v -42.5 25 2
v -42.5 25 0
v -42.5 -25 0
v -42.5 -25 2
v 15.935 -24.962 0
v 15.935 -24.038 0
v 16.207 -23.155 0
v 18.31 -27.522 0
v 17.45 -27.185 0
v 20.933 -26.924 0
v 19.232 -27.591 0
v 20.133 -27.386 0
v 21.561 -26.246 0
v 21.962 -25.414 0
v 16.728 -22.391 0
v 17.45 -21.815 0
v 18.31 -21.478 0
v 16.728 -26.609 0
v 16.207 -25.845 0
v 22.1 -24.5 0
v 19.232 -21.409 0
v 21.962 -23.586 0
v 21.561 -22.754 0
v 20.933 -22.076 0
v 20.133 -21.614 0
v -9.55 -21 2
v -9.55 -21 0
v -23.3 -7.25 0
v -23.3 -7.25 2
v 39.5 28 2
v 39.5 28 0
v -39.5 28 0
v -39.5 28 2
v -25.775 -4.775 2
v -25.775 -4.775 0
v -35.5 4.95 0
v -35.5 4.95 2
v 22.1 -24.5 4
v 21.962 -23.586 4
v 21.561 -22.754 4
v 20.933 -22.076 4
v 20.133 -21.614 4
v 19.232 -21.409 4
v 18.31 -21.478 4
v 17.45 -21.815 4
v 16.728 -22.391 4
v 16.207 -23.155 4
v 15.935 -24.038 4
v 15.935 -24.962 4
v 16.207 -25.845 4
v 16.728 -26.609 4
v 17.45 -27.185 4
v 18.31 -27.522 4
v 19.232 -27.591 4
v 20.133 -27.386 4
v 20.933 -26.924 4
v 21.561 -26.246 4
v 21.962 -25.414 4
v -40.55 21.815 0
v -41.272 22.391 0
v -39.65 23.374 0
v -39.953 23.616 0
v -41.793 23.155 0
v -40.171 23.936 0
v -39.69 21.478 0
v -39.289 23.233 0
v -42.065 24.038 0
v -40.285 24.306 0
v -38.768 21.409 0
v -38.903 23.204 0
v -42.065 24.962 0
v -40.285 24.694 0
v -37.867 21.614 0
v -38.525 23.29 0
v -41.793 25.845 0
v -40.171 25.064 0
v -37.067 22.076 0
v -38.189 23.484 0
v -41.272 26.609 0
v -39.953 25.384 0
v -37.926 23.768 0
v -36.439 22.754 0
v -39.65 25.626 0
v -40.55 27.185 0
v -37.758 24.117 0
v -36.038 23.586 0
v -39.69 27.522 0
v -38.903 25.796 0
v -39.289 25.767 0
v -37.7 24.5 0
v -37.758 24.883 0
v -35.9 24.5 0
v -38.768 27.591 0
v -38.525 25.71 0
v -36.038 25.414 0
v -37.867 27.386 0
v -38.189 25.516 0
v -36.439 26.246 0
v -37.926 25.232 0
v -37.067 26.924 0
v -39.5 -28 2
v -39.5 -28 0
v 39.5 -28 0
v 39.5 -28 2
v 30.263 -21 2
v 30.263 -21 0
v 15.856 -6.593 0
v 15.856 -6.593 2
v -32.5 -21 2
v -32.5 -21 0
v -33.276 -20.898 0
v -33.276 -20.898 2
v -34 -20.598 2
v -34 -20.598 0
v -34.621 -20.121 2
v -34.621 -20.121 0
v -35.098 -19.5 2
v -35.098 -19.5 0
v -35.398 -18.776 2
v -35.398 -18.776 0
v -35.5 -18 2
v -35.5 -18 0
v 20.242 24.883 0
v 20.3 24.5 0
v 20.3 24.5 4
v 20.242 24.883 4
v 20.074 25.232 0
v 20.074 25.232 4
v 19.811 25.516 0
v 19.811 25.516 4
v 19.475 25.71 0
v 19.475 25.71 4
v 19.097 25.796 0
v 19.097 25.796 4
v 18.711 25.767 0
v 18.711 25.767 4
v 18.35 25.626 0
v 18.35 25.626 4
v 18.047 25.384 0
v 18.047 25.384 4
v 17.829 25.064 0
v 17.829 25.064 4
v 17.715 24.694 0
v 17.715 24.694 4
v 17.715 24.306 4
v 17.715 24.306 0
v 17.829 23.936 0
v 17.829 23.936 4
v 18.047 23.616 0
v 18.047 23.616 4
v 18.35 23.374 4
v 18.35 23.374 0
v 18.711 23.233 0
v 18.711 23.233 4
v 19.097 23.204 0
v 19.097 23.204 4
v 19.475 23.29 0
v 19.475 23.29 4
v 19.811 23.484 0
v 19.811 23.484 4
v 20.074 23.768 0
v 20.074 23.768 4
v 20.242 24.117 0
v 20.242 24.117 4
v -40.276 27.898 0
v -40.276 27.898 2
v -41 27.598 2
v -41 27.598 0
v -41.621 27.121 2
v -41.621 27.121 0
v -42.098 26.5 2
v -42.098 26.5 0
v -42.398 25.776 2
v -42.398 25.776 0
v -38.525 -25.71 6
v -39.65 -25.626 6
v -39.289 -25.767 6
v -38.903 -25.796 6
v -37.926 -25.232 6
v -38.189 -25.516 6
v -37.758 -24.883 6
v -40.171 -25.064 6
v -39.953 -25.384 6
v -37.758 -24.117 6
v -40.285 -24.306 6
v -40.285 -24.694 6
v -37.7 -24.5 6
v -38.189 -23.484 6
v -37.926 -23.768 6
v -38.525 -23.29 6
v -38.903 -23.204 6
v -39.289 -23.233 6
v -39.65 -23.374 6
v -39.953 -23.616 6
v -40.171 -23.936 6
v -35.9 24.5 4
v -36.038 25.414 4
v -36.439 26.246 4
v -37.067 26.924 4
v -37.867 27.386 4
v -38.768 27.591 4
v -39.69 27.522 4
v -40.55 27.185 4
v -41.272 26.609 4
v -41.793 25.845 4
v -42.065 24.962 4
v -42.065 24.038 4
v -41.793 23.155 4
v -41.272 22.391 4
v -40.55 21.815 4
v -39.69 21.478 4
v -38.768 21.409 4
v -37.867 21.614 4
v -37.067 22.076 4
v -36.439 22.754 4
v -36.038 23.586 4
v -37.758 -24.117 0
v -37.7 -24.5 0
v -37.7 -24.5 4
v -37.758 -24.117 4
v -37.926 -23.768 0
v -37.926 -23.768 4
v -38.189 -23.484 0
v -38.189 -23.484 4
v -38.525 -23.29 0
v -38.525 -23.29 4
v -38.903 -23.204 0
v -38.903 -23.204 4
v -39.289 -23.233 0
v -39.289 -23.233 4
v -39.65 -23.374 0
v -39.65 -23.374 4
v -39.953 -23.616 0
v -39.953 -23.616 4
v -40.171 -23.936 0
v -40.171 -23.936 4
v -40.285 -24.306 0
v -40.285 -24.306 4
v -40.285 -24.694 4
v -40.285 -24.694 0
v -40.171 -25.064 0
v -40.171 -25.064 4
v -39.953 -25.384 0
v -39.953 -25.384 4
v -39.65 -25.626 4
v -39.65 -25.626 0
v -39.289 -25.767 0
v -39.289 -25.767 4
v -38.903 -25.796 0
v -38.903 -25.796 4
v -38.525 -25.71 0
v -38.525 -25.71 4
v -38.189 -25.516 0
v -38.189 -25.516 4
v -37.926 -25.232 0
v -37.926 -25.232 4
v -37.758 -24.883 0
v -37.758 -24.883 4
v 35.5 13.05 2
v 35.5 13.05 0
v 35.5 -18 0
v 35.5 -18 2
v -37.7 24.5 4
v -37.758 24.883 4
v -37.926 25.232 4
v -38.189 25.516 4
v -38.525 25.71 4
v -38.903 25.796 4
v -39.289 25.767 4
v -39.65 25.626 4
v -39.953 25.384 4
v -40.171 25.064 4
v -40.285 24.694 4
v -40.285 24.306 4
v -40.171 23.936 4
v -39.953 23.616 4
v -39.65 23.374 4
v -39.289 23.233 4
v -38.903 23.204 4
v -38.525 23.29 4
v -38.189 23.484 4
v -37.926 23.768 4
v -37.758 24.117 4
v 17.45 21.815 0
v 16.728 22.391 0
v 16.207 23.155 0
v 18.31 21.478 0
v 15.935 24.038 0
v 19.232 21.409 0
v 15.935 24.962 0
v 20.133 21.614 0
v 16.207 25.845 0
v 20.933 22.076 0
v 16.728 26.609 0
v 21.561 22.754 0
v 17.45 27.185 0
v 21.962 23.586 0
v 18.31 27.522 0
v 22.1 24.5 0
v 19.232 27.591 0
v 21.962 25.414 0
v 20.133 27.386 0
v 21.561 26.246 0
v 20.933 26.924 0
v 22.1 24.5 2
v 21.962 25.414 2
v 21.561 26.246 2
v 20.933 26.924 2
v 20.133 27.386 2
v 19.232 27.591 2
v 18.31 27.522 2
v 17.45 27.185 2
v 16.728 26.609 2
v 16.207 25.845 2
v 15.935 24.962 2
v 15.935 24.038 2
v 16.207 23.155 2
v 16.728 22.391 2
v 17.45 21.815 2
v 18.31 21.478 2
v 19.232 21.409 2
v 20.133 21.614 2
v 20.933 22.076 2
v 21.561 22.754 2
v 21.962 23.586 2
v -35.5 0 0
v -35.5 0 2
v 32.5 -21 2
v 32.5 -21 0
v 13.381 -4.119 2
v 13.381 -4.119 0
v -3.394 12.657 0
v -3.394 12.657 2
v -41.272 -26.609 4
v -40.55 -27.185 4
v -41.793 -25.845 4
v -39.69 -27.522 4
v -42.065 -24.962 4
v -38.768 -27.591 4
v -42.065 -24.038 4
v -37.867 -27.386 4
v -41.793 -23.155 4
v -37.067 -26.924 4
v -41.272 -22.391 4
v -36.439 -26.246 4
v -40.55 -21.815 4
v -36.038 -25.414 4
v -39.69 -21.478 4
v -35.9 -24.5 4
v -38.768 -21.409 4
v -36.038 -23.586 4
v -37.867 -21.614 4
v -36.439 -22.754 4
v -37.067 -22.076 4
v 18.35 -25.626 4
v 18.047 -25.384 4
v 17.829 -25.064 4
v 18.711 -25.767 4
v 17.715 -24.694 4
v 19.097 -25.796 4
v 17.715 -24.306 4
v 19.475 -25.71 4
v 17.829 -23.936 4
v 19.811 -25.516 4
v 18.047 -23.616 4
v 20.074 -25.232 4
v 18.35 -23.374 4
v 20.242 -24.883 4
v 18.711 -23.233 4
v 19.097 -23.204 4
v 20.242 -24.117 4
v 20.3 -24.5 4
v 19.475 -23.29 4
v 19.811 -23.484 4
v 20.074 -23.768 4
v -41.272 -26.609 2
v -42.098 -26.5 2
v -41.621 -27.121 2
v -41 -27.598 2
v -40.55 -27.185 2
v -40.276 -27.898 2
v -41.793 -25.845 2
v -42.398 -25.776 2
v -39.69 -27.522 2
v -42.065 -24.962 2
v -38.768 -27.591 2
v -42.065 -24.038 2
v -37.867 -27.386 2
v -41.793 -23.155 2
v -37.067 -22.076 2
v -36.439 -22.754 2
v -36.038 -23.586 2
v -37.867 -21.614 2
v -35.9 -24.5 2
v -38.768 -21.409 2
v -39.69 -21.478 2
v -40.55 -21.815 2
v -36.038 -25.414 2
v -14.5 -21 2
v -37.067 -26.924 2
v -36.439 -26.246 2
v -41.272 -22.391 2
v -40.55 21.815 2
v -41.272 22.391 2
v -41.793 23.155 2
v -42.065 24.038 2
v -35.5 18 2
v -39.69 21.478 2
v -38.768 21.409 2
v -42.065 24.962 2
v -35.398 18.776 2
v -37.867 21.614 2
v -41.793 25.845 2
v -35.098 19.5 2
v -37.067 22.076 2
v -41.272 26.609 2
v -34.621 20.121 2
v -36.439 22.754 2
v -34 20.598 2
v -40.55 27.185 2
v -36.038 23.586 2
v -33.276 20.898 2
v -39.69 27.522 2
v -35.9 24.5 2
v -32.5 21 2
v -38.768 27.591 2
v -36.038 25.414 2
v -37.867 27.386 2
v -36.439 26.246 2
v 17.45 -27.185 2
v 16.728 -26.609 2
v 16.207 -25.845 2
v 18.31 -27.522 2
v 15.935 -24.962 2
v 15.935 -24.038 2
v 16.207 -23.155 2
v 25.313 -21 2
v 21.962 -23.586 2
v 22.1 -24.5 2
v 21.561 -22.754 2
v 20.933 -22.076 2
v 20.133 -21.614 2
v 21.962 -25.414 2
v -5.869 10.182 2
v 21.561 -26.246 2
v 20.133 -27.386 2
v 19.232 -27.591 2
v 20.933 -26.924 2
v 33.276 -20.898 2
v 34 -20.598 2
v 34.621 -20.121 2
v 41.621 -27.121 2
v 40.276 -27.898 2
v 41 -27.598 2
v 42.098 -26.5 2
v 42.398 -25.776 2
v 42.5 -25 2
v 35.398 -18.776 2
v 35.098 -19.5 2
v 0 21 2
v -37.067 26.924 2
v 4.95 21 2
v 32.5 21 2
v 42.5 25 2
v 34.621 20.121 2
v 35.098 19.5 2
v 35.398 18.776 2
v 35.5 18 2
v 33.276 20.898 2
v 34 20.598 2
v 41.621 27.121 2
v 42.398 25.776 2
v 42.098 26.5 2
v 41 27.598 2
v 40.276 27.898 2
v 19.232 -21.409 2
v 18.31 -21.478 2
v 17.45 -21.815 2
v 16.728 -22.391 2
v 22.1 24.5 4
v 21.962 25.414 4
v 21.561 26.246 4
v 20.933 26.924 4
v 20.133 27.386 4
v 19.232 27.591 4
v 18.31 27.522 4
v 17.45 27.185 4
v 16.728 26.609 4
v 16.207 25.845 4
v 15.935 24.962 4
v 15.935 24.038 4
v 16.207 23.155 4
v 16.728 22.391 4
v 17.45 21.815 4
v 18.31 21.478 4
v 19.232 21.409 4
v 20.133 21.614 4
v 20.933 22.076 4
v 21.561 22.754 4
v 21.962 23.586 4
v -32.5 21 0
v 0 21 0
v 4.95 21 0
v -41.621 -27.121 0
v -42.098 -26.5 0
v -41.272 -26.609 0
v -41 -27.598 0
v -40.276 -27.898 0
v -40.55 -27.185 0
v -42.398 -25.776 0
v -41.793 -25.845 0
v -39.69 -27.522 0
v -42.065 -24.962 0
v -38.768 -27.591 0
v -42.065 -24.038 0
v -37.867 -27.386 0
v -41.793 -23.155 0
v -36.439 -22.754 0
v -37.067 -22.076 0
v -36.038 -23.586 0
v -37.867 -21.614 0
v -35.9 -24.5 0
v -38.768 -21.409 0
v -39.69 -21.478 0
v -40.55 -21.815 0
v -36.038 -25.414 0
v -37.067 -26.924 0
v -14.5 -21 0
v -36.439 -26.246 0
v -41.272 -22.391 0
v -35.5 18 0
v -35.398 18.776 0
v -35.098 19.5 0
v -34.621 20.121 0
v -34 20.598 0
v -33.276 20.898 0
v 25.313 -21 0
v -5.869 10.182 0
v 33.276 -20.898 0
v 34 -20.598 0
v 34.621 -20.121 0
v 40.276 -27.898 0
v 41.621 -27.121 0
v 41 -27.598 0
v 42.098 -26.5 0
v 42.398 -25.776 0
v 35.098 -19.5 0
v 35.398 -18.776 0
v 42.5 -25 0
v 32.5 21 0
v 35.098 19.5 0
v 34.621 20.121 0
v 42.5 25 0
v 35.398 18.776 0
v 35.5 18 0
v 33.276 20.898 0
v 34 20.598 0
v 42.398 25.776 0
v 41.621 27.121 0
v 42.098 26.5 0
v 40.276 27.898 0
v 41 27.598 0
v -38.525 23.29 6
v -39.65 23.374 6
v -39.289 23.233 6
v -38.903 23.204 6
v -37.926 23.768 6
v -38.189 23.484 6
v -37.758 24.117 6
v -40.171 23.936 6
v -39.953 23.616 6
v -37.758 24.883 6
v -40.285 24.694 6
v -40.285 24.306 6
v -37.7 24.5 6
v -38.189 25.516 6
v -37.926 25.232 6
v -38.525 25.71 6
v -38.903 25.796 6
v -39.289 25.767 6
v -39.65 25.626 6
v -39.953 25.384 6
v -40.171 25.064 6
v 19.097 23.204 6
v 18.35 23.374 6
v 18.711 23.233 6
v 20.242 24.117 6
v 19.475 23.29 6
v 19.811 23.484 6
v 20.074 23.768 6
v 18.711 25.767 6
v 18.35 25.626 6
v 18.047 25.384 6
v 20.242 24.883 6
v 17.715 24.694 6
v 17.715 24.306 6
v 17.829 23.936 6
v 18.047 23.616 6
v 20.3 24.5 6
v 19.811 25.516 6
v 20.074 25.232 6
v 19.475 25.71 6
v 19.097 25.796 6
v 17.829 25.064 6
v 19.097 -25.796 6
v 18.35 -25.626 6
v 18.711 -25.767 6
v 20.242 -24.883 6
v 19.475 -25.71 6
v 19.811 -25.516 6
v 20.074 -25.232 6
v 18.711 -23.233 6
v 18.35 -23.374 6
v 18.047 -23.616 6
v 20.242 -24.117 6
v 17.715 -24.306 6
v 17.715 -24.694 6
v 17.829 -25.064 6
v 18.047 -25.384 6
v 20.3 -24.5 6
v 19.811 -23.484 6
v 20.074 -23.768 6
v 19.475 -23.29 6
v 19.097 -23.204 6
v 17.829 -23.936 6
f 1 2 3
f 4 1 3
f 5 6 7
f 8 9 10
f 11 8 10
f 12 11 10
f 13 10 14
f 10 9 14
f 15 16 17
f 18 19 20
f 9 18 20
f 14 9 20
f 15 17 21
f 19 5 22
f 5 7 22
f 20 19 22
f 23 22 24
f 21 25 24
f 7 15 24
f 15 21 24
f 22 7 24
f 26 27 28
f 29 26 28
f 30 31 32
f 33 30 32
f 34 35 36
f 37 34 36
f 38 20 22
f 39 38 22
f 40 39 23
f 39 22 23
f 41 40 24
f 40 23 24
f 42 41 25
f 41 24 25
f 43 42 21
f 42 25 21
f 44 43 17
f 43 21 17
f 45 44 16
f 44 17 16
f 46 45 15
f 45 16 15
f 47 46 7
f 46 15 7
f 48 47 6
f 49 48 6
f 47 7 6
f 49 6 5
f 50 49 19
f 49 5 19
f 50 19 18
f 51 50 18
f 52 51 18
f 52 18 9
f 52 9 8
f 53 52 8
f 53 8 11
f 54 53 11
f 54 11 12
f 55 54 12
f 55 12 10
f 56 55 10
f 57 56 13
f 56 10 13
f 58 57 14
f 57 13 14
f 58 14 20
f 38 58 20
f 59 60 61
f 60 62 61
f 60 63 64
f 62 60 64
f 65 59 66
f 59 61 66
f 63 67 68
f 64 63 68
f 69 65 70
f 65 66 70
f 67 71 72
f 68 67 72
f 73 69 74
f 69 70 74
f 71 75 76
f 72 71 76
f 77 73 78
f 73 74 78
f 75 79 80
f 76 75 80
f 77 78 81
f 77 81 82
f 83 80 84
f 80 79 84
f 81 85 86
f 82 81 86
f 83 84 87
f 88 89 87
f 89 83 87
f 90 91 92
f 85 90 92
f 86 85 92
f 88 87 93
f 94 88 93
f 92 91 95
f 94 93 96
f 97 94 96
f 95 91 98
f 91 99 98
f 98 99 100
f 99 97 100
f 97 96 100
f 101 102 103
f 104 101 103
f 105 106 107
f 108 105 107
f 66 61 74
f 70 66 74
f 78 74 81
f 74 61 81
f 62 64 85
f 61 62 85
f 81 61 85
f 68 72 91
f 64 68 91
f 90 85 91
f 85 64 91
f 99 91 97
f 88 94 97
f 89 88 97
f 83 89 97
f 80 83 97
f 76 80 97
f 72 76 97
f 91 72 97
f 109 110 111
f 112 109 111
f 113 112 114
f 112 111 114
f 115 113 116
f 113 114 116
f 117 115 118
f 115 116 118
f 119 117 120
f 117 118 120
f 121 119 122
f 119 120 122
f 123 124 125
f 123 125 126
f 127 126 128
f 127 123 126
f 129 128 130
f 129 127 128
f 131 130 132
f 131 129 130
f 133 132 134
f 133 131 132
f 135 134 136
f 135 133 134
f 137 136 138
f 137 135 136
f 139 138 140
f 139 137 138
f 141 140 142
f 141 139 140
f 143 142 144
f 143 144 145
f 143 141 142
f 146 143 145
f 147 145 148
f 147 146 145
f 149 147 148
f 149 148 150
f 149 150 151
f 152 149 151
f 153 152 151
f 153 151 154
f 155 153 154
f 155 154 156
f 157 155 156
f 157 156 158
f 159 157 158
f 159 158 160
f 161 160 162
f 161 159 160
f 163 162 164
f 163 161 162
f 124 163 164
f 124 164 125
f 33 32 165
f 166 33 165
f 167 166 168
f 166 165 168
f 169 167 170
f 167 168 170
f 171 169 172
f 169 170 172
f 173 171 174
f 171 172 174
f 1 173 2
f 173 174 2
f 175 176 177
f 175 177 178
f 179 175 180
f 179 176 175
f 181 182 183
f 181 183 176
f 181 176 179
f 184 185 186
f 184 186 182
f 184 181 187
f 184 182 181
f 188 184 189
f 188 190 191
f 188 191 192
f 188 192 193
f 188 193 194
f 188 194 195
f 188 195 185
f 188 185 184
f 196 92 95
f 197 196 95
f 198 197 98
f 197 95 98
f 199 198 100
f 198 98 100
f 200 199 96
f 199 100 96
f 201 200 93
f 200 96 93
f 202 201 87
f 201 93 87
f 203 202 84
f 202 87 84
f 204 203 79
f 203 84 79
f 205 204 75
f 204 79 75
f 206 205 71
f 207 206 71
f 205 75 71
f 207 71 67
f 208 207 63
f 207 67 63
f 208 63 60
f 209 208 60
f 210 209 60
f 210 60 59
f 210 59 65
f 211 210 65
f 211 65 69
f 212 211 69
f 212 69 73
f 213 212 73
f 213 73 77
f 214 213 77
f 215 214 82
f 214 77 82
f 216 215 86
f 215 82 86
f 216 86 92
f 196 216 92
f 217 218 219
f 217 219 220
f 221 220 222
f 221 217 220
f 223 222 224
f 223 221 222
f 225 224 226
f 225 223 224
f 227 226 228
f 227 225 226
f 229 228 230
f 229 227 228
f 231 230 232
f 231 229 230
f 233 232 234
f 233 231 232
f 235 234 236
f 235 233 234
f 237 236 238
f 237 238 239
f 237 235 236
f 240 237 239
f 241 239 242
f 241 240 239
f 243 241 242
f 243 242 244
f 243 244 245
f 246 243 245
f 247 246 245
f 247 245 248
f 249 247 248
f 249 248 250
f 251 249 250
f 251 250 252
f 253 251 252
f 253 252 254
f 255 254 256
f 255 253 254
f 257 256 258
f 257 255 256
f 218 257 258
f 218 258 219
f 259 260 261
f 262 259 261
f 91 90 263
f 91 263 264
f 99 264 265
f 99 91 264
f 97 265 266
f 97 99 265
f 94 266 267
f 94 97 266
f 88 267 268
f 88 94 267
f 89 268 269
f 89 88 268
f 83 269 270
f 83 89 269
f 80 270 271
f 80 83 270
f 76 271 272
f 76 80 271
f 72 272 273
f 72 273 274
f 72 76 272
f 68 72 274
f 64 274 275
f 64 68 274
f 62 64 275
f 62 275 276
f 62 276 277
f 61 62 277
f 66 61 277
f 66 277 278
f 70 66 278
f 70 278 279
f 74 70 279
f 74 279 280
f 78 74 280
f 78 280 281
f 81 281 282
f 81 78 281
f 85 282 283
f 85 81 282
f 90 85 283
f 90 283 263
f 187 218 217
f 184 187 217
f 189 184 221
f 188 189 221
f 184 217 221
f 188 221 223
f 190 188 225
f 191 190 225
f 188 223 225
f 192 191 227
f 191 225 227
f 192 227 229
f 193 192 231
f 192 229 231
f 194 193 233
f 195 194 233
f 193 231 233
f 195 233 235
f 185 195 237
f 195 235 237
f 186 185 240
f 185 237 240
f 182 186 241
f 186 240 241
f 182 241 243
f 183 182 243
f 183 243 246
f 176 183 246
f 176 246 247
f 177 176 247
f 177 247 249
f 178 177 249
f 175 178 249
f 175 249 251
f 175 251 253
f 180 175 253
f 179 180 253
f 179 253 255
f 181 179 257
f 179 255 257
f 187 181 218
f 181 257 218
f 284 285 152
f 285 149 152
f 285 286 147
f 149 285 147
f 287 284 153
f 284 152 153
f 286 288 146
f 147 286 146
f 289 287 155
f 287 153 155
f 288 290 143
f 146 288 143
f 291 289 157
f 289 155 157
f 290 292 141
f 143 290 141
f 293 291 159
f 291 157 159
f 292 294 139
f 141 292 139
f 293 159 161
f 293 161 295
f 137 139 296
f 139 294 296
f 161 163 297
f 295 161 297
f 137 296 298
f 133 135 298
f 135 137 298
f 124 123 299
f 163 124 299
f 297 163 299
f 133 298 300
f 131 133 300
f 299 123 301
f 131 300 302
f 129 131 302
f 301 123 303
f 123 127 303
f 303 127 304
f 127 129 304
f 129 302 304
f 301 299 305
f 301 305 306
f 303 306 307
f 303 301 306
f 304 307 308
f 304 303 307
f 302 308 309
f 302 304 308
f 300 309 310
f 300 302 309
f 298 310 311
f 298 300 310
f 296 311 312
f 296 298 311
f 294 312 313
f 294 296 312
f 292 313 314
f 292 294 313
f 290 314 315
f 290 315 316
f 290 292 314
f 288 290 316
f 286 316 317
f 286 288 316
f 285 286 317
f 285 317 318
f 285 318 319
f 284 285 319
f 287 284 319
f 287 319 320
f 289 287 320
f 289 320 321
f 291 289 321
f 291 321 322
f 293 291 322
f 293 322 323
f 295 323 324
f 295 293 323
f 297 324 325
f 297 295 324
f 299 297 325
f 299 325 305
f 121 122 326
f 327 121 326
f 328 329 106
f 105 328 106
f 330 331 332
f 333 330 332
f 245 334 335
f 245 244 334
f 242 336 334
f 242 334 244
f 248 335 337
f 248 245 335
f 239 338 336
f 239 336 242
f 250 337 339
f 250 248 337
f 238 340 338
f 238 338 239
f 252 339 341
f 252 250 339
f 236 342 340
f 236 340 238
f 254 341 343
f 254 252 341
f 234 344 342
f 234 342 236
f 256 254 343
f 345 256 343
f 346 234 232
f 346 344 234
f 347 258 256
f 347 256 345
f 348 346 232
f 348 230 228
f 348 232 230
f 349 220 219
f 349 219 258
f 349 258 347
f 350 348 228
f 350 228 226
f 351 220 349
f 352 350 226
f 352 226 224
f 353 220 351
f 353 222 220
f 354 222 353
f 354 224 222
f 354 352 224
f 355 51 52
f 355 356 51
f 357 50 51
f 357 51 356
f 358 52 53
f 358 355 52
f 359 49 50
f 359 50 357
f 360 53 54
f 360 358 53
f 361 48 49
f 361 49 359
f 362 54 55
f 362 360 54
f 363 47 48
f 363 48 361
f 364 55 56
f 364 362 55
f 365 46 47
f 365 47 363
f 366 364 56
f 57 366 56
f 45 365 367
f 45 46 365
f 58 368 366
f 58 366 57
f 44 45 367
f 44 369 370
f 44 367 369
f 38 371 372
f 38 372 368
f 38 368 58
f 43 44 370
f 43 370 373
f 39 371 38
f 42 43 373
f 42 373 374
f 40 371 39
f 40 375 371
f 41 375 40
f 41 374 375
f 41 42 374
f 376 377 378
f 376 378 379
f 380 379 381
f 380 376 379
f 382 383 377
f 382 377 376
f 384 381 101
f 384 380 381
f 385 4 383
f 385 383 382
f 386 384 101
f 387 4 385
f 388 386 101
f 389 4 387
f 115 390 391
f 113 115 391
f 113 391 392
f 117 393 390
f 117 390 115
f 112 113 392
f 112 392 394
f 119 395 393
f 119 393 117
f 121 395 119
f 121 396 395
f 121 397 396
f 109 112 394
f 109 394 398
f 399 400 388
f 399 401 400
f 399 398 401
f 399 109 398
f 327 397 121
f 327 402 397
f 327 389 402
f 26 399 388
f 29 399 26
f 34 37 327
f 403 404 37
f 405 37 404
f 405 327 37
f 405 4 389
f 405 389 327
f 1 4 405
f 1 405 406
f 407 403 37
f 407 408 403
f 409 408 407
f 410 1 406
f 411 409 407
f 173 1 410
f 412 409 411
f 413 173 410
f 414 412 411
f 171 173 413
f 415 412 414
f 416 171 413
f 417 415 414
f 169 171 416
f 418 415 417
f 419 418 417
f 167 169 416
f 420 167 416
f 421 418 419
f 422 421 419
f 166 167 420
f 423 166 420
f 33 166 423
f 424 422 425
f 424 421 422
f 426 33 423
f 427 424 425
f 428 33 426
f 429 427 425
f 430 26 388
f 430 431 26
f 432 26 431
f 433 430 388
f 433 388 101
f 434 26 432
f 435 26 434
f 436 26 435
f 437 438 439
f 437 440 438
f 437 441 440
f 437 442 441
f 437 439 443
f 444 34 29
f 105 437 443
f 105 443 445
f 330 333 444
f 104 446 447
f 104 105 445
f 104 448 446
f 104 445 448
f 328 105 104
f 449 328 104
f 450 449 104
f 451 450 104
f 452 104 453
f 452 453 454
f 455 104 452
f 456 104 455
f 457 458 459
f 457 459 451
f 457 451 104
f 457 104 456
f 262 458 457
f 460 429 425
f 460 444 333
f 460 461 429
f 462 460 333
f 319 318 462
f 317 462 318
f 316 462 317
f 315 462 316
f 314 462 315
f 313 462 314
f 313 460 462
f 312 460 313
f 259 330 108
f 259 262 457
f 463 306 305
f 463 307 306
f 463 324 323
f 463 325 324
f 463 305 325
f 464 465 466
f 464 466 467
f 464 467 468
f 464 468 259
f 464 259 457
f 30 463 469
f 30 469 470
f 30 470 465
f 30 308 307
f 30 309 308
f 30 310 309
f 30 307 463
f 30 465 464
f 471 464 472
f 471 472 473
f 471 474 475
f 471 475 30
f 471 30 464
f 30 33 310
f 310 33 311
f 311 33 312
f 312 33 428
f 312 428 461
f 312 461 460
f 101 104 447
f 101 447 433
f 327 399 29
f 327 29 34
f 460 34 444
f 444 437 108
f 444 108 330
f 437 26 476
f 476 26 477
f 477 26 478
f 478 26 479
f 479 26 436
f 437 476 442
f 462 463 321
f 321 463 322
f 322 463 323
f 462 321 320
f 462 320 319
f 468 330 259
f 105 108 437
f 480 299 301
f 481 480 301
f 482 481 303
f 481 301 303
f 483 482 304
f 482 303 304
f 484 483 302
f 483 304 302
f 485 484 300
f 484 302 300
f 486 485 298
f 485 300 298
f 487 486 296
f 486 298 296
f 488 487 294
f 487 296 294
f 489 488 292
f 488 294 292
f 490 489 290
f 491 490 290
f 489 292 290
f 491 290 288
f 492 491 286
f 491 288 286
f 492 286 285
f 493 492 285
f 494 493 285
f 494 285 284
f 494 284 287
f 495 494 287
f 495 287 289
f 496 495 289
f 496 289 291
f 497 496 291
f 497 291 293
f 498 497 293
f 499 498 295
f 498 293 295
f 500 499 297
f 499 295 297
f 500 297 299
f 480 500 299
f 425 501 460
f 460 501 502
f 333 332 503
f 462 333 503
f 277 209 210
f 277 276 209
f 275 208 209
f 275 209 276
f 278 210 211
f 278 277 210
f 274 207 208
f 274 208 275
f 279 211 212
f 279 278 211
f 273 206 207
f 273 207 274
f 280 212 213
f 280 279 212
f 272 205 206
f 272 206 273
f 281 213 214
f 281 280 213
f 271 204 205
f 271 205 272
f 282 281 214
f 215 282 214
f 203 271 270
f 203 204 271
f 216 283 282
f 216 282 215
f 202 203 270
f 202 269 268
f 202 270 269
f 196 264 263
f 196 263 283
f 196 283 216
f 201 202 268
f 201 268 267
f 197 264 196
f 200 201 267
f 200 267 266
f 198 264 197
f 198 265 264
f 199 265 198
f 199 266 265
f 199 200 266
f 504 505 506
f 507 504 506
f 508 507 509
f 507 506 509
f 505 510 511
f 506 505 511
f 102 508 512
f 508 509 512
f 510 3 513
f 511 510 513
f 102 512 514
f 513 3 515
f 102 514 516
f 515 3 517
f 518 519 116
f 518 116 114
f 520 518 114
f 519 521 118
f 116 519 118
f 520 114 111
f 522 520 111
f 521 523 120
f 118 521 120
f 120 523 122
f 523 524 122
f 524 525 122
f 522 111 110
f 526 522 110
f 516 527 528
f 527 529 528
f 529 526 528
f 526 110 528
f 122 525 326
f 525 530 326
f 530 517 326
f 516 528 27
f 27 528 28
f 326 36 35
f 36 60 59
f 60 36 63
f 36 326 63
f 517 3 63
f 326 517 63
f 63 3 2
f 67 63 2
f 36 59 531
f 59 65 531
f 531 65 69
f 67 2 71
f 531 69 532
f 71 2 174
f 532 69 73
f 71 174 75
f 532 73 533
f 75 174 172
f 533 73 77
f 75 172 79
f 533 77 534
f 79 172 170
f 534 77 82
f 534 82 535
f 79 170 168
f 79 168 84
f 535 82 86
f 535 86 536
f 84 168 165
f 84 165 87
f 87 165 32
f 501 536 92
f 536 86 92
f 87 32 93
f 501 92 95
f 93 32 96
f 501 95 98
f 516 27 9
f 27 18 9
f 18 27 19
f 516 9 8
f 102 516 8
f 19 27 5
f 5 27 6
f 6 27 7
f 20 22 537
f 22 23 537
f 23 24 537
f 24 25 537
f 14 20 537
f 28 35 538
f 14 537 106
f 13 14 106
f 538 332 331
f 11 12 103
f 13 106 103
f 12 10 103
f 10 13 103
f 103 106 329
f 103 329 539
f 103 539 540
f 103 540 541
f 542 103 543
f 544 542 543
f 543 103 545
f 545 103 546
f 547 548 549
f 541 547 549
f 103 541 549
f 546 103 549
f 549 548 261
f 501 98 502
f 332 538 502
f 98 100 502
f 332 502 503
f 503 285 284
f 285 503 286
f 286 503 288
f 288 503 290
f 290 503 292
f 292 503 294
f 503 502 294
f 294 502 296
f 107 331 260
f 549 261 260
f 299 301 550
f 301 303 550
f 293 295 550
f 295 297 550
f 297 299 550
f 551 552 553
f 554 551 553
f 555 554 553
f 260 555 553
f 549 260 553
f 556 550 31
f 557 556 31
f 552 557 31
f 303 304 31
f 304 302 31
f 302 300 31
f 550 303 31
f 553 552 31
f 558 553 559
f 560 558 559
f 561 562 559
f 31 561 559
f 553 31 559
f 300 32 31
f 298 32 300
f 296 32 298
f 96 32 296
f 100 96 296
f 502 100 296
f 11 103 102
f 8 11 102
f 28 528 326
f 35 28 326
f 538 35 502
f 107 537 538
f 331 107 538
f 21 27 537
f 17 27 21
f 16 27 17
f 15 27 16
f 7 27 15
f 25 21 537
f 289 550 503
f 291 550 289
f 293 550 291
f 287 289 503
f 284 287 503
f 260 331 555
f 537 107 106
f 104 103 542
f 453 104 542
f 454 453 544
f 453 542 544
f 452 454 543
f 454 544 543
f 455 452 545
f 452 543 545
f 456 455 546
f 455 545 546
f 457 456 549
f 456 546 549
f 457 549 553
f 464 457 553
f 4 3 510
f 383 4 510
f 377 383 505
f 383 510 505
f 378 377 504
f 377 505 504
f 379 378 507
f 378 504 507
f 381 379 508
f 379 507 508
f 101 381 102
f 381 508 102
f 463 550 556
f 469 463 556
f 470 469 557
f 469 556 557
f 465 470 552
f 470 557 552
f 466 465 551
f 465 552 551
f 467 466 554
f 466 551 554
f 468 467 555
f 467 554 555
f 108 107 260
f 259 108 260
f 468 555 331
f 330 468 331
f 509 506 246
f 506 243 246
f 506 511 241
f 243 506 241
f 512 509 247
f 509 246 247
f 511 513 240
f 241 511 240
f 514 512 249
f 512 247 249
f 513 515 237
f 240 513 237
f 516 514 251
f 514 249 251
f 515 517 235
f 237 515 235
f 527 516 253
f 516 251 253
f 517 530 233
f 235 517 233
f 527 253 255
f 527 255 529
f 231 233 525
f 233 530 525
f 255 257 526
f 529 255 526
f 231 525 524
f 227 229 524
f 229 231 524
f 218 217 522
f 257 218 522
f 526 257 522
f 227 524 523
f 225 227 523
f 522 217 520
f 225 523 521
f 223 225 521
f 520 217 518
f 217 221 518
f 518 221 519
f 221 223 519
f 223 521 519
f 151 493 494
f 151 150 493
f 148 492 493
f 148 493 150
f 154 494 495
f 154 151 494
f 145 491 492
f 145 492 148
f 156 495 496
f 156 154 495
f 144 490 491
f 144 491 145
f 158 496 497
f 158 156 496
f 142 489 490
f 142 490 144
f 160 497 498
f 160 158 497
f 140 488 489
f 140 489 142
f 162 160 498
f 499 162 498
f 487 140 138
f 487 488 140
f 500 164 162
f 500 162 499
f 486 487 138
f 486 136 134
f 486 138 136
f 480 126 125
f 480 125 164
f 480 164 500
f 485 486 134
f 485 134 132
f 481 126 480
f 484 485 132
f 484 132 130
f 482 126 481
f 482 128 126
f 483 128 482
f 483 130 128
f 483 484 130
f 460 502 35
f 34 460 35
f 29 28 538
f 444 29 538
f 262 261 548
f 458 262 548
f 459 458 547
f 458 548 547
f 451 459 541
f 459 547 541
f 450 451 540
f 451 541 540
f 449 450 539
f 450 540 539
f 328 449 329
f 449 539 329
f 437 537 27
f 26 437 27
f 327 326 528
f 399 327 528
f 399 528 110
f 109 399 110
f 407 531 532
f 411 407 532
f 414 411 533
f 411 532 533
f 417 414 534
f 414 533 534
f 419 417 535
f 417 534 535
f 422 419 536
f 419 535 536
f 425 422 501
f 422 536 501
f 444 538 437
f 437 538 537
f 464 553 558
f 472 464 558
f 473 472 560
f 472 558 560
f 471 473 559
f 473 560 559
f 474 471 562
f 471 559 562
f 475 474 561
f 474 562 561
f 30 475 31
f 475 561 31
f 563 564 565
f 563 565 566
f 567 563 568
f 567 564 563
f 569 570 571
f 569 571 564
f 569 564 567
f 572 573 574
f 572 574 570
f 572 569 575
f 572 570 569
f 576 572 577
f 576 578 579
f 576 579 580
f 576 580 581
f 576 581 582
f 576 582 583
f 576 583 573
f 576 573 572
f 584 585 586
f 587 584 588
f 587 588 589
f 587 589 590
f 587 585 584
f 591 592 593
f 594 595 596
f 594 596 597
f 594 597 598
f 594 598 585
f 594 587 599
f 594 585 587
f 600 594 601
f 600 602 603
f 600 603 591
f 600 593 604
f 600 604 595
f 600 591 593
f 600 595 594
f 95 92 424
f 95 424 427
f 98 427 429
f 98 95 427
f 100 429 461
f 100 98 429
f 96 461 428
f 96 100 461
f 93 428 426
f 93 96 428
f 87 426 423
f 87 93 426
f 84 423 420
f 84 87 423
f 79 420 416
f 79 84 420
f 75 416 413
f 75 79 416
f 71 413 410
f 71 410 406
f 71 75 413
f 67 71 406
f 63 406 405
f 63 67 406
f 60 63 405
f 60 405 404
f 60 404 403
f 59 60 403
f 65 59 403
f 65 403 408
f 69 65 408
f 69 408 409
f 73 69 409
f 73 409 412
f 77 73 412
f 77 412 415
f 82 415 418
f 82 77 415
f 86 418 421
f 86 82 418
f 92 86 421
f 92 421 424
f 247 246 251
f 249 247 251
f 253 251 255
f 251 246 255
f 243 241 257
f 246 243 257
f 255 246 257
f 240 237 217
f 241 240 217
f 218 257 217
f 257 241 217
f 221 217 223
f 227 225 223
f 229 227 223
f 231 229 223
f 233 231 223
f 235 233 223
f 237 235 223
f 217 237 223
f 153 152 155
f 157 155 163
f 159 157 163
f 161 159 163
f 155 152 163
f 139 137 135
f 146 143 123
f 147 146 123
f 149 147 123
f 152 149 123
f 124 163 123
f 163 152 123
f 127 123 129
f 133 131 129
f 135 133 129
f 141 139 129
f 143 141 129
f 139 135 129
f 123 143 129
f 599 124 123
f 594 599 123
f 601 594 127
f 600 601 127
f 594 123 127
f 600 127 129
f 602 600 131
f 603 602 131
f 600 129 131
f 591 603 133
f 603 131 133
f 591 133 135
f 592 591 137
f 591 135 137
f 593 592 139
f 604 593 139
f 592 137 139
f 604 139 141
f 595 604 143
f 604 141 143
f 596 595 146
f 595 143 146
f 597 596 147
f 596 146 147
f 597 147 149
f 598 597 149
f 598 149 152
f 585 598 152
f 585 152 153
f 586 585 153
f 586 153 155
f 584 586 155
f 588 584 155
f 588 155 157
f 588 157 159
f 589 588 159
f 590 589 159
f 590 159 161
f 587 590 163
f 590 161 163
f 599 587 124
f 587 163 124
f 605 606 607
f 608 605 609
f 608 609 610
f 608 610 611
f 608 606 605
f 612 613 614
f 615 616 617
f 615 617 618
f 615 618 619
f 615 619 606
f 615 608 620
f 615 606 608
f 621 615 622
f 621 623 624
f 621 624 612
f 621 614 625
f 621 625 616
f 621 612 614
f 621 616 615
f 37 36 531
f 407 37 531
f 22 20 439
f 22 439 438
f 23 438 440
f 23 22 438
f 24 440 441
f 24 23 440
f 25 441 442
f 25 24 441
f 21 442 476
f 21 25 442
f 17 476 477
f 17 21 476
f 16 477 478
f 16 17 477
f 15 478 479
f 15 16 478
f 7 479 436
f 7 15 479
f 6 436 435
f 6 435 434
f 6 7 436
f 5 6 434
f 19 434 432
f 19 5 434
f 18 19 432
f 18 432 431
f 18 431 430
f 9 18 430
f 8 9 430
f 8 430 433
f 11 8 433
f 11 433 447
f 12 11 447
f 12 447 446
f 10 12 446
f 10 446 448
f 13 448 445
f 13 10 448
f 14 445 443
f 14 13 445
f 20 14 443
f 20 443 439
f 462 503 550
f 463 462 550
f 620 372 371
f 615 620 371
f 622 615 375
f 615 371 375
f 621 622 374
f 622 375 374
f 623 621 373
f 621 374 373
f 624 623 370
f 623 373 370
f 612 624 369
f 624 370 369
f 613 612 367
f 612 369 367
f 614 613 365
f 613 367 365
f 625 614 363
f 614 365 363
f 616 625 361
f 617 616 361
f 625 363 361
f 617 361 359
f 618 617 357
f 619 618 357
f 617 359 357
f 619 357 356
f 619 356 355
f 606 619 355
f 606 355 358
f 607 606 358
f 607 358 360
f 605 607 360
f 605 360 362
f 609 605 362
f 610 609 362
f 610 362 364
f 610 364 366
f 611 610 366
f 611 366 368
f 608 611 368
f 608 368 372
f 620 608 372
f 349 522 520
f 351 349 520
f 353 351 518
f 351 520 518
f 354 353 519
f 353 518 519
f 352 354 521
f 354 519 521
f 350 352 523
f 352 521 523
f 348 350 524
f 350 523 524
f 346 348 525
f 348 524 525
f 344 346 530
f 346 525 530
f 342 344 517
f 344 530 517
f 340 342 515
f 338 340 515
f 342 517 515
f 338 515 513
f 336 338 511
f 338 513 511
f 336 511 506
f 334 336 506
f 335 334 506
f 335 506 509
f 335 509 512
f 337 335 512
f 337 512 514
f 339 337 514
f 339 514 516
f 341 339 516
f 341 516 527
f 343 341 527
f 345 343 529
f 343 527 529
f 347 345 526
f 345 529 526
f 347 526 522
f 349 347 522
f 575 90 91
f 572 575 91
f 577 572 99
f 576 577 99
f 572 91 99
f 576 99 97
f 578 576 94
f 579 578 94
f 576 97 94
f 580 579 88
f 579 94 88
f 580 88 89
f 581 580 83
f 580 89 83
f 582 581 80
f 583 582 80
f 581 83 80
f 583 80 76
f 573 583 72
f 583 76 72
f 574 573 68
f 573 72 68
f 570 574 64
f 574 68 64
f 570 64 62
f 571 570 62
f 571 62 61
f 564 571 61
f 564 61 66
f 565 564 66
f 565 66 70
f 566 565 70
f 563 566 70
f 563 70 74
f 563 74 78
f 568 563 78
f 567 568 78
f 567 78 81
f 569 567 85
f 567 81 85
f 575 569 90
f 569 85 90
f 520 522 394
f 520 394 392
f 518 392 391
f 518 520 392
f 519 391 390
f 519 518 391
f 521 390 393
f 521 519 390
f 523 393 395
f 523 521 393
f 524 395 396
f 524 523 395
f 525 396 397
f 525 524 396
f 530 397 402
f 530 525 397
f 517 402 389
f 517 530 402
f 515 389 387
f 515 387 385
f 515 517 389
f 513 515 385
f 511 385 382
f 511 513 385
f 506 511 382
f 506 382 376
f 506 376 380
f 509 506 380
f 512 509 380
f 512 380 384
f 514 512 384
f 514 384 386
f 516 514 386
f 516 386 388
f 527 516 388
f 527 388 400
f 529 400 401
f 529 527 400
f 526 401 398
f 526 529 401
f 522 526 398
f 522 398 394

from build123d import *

# Parameters (mm, degrees)
F0_R     = 3.1
F0_R_2   = 1.3
F1_DEPTH = 4
F2_DEPTH = 2
F3_DEPTH = 6


with BuildPart() as f1:
    # F0 (on Top) → F1 (new body)
    with BuildSketch(Plane.XY):
        with Locations((-39, -24.5)):
            Circle(F0_R)
        with Locations((-39, -24.5)):
            Circle(F0_R_2, mode=Mode.SUBTRACT)
    extrude(amount=F1_DEPTH)


with BuildPart() as f1b:
    # F0 (on Top) → F1, piece 2 (new body)
    with BuildSketch(Plane.XY):
        with Locations((19, -24.5)):
            Circle(F0_R)
        with Locations((19, -24.5)):
            Circle(F0_R_2, mode=Mode.SUBTRACT)
    extrude(amount=F1_DEPTH)

    # F0 (on Top) → F3 (join)
    with BuildSketch(Plane.XY):
        with Locations((19, -24.5)):
            Circle(F0_R_2)
    extrude(amount=F3_DEPTH)


with BuildPart() as f1c:
    # F0 (on Top) → F1, piece 3 (new body)
    with BuildSketch(Plane.XY):
        with Locations((-39, 24.5)):
            Circle(F0_R)
        with Locations((-39, 24.5)):
            Circle(F0_R_2, mode=Mode.SUBTRACT)
    extrude(amount=F1_DEPTH)


with BuildPart() as f1d:
    # F0 (on Top) → F1, piece 4 (new body)
    with BuildSketch(Plane.XY):
        with Locations((19, 24.5)):
            Circle(F0_R)
        with Locations((19, 24.5)):
            Circle(F0_R_2, mode=Mode.SUBTRACT)
    extrude(amount=F1_DEPTH)


with BuildPart() as f2:
    # F0 (on Top) → F2 (new body)
    with BuildSketch(Plane.XY):
        with BuildLine():
            Line((39.5, 28), (-39.5, 28))
            ThreePointArc((-39.5, 28), (-41.6213203436, 27.1213203436), (-42.5, 25))
            Line((-42.5, 25), (-42.5, -25))
            ThreePointArc((-42.5, -25), (-41.6213203436, -27.1213203436), (-39.5, -28))
            Line((-39.5, -28), (39.5, -28))
            ThreePointArc((39.5, -28), (41.6213203436, -27.1213203436), (42.5, -25))
            Line((42.5, -25), (42.5, 25))
            ThreePointArc((42.5, 25), (41.6213203436, 27.1213203436), (39.5, 28))
        make_face()
        with Locations((-39, -24.5)):
            Circle(F0_R, mode=Mode.SUBTRACT)
        with Locations((19, -24.5)):
            Circle(F0_R, mode=Mode.SUBTRACT)
        with Locations((-39, 24.5)):
            Circle(F0_R, mode=Mode.SUBTRACT)
        with BuildLine():
            ThreePointArc((-35.5, 18), (-34.6213203436, 20.1213203436), (-32.5, 21))
            Line((-32.5, 21), (0, 21))
            Line((0, 21), (4.9497474683, 21))
            Line((4.9497474683, 21), (32.5, 21))
            ThreePointArc((32.5, 21), (34.6213203436, 20.1213203436), (35.5, 18))
            Line((35.5, 18), (35.5, 13.0502525317))
            Line((35.5, 13.0502525317), (35.5, -18))
            ThreePointArc((35.5, -18), (34.6213203436, -20.1213203436), (32.5, -21))
            Line((32.5, -21), (30.2628741404, -21))
            Line((30.2628741404, -21), (25.3131266721, -21))
            Line((25.3131266721, -21), (-9.5502525317, -21))
            Line((-9.5502525317, -21), (-14.5, -21))
            Line((-14.5, -21), (-32.5, -21))
            ThreePointArc((-32.5, -21), (-34.6213203436, -20.1213203436), (-35.5, -18))
            Line((-35.5, -18), (-35.5, 0))
            Line((-35.5, 0), (-35.5, 4.9497474683))
            Line((-35.5, 4.9497474683), (-35.5, 18))
        make_face(mode=Mode.SUBTRACT)
        with Locations((19, 24.5)):
            Circle(F0_R, mode=Mode.SUBTRACT)
        Polygon((4.9497474683, 21), (0, 21), (-25.7751262658, -4.7751262658), (-23.3002525317, -7.25), (-5.8685629298, 10.1816896019), (-3.3936891957, 12.656563336), align=None)
        Polygon((-23.3002525317, -7.25), (-25.7751262658, -4.7751262658), (-35.5, 4.9497474683), (-35.5, 0), (-14.5, -21), (-9.5502525317, -21), align=None)
        Polygon((13.3814370702, -4.1185629298), (-3.3936891957, 12.656563336), (-5.8685629298, 10.1816896019), (25.3131266721, -21), (30.2628741404, -21), (15.8563108043, -6.593436664), align=None)
        Polygon((35.5, 13.0502525317), (35.5, 18), (13.3814370702, -4.1185629298), (15.8563108043, -6.593436664), align=None)
    extrude(amount=F2_DEPTH)


with BuildPart() as f3:
    # F0 (on Top) → F3, piece 2 (new body)
    with BuildSketch(Plane.XY):
        with Locations((-39, -24.5)):
            Circle(F0_R_2)
    extrude(amount=F3_DEPTH)


with BuildPart() as f3b:
    # F0 (on Top) → F3, piece 3 (new body)
    with BuildSketch(Plane.XY):
        with Locations((-39, 24.5)):
            Circle(F0_R_2)
    extrude(amount=F3_DEPTH)


with BuildPart() as f3c:
    # F0 (on Top) → F3, piece 4 (new body)
    with BuildSketch(Plane.XY):
        with Locations((19, 24.5)):
            Circle(F0_R_2)
    extrude(amount=F3_DEPTH)


solid = Compound([f1.part, f1b.part, f1c.part, f1d.part, f2.part, f3.part, f3b.part, f3c.part])
